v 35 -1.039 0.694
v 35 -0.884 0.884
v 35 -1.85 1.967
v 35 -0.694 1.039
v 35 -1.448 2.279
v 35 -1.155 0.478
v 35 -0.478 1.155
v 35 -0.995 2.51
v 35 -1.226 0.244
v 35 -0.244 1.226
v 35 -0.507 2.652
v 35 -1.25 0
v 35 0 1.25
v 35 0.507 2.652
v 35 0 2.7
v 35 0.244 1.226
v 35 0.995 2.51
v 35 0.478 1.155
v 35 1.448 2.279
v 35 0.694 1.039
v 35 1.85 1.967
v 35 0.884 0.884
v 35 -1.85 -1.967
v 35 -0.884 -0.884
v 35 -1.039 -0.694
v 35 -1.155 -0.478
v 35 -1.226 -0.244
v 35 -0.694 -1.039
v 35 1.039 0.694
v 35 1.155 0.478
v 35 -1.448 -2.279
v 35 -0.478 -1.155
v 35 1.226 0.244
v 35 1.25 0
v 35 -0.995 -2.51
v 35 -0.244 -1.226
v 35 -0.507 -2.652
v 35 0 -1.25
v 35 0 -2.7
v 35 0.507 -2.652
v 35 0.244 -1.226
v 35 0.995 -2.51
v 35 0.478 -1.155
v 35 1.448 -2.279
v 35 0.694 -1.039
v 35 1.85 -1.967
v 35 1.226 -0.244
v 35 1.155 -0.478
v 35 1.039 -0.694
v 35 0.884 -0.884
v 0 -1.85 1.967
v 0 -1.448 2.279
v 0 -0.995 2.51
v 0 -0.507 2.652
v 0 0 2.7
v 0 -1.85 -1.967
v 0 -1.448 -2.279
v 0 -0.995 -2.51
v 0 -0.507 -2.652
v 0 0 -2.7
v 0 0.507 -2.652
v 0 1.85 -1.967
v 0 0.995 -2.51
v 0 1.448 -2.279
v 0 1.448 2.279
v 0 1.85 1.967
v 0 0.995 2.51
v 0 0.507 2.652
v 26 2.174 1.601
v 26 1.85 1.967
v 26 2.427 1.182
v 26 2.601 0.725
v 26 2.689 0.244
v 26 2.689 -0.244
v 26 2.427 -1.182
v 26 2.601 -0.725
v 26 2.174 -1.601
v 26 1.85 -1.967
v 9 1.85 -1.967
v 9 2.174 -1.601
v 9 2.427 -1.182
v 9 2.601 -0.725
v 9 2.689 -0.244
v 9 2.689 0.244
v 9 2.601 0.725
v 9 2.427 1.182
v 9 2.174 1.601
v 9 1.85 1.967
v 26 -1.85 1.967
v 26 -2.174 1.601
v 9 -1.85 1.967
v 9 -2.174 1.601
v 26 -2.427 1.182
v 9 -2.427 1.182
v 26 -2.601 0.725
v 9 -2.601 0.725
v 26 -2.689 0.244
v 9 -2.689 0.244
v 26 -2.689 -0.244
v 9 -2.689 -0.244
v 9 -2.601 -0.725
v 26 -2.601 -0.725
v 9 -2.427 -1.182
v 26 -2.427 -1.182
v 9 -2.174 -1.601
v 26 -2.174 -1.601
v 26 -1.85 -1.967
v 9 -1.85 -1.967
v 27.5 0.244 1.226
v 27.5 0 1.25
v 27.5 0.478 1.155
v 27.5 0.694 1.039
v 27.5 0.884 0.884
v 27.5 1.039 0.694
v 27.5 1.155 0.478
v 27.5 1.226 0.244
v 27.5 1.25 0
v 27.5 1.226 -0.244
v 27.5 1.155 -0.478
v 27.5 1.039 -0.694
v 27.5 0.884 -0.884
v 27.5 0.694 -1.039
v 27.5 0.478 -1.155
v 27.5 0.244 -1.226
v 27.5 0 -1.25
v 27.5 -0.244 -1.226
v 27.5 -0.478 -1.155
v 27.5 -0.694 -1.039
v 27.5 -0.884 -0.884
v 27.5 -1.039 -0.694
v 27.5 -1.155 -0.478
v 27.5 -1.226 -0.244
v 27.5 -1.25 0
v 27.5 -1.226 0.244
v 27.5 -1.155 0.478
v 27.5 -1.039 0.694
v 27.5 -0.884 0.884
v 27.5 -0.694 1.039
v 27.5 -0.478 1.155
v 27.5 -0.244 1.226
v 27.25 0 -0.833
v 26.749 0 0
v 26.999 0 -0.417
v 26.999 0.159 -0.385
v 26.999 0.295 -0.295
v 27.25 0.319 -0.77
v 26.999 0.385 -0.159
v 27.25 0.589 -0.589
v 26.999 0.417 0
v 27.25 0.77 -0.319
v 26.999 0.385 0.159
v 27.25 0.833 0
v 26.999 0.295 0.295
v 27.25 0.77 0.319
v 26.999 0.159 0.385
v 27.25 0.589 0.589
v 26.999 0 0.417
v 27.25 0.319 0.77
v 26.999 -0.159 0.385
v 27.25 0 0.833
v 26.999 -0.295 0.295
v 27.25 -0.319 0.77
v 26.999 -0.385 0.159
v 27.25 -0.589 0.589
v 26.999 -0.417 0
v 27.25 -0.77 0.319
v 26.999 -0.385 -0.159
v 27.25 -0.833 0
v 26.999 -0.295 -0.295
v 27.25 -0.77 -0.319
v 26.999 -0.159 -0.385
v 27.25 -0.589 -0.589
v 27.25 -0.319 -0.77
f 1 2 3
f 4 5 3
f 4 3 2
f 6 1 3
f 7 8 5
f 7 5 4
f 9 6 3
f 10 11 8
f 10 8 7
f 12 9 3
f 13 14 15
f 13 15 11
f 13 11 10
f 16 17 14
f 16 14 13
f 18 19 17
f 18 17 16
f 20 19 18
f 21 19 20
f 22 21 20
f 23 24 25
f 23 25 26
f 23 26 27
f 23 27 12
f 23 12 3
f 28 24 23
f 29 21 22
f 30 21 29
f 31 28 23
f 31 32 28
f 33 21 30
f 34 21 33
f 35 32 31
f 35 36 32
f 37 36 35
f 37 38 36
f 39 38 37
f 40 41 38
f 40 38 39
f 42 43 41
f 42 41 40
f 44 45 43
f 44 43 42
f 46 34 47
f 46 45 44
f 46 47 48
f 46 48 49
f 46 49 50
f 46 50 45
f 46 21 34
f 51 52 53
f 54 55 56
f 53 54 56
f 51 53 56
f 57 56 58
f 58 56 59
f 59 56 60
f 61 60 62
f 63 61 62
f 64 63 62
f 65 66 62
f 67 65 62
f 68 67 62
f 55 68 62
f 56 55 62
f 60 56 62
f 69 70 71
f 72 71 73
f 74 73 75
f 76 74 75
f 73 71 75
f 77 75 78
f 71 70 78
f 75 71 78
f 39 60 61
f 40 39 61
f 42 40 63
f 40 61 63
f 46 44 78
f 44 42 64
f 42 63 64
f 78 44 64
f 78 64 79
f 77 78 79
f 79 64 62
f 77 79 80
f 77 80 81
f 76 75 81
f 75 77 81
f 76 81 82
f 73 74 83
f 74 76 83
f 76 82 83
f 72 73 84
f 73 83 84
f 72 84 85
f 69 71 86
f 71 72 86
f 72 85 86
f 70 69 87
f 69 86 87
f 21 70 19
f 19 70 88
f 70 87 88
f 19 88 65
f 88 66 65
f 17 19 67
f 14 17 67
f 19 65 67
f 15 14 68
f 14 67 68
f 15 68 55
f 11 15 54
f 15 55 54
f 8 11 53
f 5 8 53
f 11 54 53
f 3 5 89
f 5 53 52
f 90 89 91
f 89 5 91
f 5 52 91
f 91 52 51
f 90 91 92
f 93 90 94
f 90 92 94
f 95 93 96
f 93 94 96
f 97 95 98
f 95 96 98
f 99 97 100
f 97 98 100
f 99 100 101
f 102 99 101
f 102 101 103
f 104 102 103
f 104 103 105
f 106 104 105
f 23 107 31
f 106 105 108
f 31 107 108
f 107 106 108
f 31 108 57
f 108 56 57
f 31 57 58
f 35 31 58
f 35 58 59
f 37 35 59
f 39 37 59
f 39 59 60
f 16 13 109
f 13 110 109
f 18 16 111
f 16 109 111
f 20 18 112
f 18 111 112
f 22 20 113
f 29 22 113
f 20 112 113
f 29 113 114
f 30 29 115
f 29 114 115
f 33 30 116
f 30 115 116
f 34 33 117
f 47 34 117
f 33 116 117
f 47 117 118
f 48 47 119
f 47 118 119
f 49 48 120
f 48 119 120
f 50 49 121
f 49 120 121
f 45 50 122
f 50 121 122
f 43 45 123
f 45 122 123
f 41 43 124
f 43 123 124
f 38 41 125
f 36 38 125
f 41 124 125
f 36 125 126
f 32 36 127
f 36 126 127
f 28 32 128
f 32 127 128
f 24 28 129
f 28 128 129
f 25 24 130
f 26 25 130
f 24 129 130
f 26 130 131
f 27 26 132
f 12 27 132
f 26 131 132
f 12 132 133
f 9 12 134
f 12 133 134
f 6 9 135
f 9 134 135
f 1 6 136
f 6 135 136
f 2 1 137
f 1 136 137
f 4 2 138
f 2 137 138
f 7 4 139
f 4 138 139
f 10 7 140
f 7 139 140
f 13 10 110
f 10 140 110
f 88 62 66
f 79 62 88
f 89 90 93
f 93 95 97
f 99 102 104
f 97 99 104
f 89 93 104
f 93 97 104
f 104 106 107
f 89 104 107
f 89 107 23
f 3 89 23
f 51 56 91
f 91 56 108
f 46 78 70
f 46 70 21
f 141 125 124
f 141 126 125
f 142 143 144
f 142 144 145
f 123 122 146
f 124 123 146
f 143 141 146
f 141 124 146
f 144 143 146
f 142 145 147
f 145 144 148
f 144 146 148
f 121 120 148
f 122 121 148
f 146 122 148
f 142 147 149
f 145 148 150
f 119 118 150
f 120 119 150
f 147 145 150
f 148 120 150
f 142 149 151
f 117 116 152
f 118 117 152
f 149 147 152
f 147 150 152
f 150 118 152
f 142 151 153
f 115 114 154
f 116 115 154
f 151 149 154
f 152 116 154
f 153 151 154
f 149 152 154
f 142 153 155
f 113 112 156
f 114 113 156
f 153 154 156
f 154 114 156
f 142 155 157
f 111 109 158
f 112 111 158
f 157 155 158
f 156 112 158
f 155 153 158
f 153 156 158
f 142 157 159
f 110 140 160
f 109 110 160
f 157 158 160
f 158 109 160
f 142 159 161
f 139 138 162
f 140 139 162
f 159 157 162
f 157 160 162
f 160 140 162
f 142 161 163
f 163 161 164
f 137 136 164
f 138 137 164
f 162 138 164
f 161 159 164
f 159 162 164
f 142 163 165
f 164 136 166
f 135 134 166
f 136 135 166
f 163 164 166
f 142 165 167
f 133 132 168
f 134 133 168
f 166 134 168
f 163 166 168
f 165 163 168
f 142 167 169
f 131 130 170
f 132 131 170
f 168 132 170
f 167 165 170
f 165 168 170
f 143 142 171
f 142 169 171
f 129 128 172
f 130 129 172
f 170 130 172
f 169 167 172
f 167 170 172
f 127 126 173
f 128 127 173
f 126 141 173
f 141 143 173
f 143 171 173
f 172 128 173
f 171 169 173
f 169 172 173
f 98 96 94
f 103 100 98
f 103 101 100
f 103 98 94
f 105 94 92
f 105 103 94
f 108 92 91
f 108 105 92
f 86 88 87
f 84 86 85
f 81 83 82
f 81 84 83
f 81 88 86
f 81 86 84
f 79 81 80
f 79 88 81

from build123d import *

# Parameters (mm, degrees)
SKETCH1_R               = 2.7
BOSS_EXTRUDE1_DEPTH     = 35
CUT_EXTRUDE1_DEPTH      = 36.207669619
CUT_EXTRUDE1_DEPTH_BACK = 36.207669619
SKETCH2_W               = 9
SKETCH2_H               = 0.85
M3_TAPPED_HOLE1_D       = 2.5
M3_TAPPED_HOLE1_DEPTH   = 7.5
M3_TAPPED_HOLE1_TIP     = 0.751075774


with BuildPart() as part:
    # Sketch1 → Boss-Extrude1 (new body)
    with BuildSketch(Plane(origin=(0, 0, 0), x_dir=(0, 0, -1), z_dir=(1, 0, 0))):
        Circle(SKETCH1_R)
    extrude(amount=BOSS_EXTRUDE1_DEPTH)

    # Sketch2 → Cut-Extrude1 (cut, two sides: drawn at the far end of the back side and taken through both)
    with BuildSketch(Plane.XY.offset(-CUT_EXTRUDE1_DEPTH_BACK)):
        with Locations((30.5, 2.275)):
            Rectangle(SKETCH2_W, SKETCH2_H)
        with Locations((30.5, -2.275)):
            Rectangle(SKETCH2_W, SKETCH2_H)
        with Locations((4.5, -2.275)):
            Rectangle(SKETCH2_W, SKETCH2_H)
        with Locations((4.5, 2.275)):
            Rectangle(SKETCH2_W, SKETCH2_H)
    extrude(amount=CUT_EXTRUDE1_DEPTH + CUT_EXTRUDE1_DEPTH_BACK, mode=Mode.SUBTRACT)

    # M3 Tapped Hole1
    with Locations(Plane(origin=(35, 0, 0), x_dir=(0, 0, -1), z_dir=(1, 0, 0))):
        with Locations((0, 0)):
            Hole(M3_TAPPED_HOLE1_D / 2, depth=M3_TAPPED_HOLE1_DEPTH)
            with Locations((0, 0, -(M3_TAPPED_HOLE1_DEPTH + M3_TAPPED_HOLE1_TIP / 2))):  # 118° drill point
                Cone(0, M3_TAPPED_HOLE1_D / 2, M3_TAPPED_HOLE1_TIP, mode=Mode.SUBTRACT)


solid = part.part
